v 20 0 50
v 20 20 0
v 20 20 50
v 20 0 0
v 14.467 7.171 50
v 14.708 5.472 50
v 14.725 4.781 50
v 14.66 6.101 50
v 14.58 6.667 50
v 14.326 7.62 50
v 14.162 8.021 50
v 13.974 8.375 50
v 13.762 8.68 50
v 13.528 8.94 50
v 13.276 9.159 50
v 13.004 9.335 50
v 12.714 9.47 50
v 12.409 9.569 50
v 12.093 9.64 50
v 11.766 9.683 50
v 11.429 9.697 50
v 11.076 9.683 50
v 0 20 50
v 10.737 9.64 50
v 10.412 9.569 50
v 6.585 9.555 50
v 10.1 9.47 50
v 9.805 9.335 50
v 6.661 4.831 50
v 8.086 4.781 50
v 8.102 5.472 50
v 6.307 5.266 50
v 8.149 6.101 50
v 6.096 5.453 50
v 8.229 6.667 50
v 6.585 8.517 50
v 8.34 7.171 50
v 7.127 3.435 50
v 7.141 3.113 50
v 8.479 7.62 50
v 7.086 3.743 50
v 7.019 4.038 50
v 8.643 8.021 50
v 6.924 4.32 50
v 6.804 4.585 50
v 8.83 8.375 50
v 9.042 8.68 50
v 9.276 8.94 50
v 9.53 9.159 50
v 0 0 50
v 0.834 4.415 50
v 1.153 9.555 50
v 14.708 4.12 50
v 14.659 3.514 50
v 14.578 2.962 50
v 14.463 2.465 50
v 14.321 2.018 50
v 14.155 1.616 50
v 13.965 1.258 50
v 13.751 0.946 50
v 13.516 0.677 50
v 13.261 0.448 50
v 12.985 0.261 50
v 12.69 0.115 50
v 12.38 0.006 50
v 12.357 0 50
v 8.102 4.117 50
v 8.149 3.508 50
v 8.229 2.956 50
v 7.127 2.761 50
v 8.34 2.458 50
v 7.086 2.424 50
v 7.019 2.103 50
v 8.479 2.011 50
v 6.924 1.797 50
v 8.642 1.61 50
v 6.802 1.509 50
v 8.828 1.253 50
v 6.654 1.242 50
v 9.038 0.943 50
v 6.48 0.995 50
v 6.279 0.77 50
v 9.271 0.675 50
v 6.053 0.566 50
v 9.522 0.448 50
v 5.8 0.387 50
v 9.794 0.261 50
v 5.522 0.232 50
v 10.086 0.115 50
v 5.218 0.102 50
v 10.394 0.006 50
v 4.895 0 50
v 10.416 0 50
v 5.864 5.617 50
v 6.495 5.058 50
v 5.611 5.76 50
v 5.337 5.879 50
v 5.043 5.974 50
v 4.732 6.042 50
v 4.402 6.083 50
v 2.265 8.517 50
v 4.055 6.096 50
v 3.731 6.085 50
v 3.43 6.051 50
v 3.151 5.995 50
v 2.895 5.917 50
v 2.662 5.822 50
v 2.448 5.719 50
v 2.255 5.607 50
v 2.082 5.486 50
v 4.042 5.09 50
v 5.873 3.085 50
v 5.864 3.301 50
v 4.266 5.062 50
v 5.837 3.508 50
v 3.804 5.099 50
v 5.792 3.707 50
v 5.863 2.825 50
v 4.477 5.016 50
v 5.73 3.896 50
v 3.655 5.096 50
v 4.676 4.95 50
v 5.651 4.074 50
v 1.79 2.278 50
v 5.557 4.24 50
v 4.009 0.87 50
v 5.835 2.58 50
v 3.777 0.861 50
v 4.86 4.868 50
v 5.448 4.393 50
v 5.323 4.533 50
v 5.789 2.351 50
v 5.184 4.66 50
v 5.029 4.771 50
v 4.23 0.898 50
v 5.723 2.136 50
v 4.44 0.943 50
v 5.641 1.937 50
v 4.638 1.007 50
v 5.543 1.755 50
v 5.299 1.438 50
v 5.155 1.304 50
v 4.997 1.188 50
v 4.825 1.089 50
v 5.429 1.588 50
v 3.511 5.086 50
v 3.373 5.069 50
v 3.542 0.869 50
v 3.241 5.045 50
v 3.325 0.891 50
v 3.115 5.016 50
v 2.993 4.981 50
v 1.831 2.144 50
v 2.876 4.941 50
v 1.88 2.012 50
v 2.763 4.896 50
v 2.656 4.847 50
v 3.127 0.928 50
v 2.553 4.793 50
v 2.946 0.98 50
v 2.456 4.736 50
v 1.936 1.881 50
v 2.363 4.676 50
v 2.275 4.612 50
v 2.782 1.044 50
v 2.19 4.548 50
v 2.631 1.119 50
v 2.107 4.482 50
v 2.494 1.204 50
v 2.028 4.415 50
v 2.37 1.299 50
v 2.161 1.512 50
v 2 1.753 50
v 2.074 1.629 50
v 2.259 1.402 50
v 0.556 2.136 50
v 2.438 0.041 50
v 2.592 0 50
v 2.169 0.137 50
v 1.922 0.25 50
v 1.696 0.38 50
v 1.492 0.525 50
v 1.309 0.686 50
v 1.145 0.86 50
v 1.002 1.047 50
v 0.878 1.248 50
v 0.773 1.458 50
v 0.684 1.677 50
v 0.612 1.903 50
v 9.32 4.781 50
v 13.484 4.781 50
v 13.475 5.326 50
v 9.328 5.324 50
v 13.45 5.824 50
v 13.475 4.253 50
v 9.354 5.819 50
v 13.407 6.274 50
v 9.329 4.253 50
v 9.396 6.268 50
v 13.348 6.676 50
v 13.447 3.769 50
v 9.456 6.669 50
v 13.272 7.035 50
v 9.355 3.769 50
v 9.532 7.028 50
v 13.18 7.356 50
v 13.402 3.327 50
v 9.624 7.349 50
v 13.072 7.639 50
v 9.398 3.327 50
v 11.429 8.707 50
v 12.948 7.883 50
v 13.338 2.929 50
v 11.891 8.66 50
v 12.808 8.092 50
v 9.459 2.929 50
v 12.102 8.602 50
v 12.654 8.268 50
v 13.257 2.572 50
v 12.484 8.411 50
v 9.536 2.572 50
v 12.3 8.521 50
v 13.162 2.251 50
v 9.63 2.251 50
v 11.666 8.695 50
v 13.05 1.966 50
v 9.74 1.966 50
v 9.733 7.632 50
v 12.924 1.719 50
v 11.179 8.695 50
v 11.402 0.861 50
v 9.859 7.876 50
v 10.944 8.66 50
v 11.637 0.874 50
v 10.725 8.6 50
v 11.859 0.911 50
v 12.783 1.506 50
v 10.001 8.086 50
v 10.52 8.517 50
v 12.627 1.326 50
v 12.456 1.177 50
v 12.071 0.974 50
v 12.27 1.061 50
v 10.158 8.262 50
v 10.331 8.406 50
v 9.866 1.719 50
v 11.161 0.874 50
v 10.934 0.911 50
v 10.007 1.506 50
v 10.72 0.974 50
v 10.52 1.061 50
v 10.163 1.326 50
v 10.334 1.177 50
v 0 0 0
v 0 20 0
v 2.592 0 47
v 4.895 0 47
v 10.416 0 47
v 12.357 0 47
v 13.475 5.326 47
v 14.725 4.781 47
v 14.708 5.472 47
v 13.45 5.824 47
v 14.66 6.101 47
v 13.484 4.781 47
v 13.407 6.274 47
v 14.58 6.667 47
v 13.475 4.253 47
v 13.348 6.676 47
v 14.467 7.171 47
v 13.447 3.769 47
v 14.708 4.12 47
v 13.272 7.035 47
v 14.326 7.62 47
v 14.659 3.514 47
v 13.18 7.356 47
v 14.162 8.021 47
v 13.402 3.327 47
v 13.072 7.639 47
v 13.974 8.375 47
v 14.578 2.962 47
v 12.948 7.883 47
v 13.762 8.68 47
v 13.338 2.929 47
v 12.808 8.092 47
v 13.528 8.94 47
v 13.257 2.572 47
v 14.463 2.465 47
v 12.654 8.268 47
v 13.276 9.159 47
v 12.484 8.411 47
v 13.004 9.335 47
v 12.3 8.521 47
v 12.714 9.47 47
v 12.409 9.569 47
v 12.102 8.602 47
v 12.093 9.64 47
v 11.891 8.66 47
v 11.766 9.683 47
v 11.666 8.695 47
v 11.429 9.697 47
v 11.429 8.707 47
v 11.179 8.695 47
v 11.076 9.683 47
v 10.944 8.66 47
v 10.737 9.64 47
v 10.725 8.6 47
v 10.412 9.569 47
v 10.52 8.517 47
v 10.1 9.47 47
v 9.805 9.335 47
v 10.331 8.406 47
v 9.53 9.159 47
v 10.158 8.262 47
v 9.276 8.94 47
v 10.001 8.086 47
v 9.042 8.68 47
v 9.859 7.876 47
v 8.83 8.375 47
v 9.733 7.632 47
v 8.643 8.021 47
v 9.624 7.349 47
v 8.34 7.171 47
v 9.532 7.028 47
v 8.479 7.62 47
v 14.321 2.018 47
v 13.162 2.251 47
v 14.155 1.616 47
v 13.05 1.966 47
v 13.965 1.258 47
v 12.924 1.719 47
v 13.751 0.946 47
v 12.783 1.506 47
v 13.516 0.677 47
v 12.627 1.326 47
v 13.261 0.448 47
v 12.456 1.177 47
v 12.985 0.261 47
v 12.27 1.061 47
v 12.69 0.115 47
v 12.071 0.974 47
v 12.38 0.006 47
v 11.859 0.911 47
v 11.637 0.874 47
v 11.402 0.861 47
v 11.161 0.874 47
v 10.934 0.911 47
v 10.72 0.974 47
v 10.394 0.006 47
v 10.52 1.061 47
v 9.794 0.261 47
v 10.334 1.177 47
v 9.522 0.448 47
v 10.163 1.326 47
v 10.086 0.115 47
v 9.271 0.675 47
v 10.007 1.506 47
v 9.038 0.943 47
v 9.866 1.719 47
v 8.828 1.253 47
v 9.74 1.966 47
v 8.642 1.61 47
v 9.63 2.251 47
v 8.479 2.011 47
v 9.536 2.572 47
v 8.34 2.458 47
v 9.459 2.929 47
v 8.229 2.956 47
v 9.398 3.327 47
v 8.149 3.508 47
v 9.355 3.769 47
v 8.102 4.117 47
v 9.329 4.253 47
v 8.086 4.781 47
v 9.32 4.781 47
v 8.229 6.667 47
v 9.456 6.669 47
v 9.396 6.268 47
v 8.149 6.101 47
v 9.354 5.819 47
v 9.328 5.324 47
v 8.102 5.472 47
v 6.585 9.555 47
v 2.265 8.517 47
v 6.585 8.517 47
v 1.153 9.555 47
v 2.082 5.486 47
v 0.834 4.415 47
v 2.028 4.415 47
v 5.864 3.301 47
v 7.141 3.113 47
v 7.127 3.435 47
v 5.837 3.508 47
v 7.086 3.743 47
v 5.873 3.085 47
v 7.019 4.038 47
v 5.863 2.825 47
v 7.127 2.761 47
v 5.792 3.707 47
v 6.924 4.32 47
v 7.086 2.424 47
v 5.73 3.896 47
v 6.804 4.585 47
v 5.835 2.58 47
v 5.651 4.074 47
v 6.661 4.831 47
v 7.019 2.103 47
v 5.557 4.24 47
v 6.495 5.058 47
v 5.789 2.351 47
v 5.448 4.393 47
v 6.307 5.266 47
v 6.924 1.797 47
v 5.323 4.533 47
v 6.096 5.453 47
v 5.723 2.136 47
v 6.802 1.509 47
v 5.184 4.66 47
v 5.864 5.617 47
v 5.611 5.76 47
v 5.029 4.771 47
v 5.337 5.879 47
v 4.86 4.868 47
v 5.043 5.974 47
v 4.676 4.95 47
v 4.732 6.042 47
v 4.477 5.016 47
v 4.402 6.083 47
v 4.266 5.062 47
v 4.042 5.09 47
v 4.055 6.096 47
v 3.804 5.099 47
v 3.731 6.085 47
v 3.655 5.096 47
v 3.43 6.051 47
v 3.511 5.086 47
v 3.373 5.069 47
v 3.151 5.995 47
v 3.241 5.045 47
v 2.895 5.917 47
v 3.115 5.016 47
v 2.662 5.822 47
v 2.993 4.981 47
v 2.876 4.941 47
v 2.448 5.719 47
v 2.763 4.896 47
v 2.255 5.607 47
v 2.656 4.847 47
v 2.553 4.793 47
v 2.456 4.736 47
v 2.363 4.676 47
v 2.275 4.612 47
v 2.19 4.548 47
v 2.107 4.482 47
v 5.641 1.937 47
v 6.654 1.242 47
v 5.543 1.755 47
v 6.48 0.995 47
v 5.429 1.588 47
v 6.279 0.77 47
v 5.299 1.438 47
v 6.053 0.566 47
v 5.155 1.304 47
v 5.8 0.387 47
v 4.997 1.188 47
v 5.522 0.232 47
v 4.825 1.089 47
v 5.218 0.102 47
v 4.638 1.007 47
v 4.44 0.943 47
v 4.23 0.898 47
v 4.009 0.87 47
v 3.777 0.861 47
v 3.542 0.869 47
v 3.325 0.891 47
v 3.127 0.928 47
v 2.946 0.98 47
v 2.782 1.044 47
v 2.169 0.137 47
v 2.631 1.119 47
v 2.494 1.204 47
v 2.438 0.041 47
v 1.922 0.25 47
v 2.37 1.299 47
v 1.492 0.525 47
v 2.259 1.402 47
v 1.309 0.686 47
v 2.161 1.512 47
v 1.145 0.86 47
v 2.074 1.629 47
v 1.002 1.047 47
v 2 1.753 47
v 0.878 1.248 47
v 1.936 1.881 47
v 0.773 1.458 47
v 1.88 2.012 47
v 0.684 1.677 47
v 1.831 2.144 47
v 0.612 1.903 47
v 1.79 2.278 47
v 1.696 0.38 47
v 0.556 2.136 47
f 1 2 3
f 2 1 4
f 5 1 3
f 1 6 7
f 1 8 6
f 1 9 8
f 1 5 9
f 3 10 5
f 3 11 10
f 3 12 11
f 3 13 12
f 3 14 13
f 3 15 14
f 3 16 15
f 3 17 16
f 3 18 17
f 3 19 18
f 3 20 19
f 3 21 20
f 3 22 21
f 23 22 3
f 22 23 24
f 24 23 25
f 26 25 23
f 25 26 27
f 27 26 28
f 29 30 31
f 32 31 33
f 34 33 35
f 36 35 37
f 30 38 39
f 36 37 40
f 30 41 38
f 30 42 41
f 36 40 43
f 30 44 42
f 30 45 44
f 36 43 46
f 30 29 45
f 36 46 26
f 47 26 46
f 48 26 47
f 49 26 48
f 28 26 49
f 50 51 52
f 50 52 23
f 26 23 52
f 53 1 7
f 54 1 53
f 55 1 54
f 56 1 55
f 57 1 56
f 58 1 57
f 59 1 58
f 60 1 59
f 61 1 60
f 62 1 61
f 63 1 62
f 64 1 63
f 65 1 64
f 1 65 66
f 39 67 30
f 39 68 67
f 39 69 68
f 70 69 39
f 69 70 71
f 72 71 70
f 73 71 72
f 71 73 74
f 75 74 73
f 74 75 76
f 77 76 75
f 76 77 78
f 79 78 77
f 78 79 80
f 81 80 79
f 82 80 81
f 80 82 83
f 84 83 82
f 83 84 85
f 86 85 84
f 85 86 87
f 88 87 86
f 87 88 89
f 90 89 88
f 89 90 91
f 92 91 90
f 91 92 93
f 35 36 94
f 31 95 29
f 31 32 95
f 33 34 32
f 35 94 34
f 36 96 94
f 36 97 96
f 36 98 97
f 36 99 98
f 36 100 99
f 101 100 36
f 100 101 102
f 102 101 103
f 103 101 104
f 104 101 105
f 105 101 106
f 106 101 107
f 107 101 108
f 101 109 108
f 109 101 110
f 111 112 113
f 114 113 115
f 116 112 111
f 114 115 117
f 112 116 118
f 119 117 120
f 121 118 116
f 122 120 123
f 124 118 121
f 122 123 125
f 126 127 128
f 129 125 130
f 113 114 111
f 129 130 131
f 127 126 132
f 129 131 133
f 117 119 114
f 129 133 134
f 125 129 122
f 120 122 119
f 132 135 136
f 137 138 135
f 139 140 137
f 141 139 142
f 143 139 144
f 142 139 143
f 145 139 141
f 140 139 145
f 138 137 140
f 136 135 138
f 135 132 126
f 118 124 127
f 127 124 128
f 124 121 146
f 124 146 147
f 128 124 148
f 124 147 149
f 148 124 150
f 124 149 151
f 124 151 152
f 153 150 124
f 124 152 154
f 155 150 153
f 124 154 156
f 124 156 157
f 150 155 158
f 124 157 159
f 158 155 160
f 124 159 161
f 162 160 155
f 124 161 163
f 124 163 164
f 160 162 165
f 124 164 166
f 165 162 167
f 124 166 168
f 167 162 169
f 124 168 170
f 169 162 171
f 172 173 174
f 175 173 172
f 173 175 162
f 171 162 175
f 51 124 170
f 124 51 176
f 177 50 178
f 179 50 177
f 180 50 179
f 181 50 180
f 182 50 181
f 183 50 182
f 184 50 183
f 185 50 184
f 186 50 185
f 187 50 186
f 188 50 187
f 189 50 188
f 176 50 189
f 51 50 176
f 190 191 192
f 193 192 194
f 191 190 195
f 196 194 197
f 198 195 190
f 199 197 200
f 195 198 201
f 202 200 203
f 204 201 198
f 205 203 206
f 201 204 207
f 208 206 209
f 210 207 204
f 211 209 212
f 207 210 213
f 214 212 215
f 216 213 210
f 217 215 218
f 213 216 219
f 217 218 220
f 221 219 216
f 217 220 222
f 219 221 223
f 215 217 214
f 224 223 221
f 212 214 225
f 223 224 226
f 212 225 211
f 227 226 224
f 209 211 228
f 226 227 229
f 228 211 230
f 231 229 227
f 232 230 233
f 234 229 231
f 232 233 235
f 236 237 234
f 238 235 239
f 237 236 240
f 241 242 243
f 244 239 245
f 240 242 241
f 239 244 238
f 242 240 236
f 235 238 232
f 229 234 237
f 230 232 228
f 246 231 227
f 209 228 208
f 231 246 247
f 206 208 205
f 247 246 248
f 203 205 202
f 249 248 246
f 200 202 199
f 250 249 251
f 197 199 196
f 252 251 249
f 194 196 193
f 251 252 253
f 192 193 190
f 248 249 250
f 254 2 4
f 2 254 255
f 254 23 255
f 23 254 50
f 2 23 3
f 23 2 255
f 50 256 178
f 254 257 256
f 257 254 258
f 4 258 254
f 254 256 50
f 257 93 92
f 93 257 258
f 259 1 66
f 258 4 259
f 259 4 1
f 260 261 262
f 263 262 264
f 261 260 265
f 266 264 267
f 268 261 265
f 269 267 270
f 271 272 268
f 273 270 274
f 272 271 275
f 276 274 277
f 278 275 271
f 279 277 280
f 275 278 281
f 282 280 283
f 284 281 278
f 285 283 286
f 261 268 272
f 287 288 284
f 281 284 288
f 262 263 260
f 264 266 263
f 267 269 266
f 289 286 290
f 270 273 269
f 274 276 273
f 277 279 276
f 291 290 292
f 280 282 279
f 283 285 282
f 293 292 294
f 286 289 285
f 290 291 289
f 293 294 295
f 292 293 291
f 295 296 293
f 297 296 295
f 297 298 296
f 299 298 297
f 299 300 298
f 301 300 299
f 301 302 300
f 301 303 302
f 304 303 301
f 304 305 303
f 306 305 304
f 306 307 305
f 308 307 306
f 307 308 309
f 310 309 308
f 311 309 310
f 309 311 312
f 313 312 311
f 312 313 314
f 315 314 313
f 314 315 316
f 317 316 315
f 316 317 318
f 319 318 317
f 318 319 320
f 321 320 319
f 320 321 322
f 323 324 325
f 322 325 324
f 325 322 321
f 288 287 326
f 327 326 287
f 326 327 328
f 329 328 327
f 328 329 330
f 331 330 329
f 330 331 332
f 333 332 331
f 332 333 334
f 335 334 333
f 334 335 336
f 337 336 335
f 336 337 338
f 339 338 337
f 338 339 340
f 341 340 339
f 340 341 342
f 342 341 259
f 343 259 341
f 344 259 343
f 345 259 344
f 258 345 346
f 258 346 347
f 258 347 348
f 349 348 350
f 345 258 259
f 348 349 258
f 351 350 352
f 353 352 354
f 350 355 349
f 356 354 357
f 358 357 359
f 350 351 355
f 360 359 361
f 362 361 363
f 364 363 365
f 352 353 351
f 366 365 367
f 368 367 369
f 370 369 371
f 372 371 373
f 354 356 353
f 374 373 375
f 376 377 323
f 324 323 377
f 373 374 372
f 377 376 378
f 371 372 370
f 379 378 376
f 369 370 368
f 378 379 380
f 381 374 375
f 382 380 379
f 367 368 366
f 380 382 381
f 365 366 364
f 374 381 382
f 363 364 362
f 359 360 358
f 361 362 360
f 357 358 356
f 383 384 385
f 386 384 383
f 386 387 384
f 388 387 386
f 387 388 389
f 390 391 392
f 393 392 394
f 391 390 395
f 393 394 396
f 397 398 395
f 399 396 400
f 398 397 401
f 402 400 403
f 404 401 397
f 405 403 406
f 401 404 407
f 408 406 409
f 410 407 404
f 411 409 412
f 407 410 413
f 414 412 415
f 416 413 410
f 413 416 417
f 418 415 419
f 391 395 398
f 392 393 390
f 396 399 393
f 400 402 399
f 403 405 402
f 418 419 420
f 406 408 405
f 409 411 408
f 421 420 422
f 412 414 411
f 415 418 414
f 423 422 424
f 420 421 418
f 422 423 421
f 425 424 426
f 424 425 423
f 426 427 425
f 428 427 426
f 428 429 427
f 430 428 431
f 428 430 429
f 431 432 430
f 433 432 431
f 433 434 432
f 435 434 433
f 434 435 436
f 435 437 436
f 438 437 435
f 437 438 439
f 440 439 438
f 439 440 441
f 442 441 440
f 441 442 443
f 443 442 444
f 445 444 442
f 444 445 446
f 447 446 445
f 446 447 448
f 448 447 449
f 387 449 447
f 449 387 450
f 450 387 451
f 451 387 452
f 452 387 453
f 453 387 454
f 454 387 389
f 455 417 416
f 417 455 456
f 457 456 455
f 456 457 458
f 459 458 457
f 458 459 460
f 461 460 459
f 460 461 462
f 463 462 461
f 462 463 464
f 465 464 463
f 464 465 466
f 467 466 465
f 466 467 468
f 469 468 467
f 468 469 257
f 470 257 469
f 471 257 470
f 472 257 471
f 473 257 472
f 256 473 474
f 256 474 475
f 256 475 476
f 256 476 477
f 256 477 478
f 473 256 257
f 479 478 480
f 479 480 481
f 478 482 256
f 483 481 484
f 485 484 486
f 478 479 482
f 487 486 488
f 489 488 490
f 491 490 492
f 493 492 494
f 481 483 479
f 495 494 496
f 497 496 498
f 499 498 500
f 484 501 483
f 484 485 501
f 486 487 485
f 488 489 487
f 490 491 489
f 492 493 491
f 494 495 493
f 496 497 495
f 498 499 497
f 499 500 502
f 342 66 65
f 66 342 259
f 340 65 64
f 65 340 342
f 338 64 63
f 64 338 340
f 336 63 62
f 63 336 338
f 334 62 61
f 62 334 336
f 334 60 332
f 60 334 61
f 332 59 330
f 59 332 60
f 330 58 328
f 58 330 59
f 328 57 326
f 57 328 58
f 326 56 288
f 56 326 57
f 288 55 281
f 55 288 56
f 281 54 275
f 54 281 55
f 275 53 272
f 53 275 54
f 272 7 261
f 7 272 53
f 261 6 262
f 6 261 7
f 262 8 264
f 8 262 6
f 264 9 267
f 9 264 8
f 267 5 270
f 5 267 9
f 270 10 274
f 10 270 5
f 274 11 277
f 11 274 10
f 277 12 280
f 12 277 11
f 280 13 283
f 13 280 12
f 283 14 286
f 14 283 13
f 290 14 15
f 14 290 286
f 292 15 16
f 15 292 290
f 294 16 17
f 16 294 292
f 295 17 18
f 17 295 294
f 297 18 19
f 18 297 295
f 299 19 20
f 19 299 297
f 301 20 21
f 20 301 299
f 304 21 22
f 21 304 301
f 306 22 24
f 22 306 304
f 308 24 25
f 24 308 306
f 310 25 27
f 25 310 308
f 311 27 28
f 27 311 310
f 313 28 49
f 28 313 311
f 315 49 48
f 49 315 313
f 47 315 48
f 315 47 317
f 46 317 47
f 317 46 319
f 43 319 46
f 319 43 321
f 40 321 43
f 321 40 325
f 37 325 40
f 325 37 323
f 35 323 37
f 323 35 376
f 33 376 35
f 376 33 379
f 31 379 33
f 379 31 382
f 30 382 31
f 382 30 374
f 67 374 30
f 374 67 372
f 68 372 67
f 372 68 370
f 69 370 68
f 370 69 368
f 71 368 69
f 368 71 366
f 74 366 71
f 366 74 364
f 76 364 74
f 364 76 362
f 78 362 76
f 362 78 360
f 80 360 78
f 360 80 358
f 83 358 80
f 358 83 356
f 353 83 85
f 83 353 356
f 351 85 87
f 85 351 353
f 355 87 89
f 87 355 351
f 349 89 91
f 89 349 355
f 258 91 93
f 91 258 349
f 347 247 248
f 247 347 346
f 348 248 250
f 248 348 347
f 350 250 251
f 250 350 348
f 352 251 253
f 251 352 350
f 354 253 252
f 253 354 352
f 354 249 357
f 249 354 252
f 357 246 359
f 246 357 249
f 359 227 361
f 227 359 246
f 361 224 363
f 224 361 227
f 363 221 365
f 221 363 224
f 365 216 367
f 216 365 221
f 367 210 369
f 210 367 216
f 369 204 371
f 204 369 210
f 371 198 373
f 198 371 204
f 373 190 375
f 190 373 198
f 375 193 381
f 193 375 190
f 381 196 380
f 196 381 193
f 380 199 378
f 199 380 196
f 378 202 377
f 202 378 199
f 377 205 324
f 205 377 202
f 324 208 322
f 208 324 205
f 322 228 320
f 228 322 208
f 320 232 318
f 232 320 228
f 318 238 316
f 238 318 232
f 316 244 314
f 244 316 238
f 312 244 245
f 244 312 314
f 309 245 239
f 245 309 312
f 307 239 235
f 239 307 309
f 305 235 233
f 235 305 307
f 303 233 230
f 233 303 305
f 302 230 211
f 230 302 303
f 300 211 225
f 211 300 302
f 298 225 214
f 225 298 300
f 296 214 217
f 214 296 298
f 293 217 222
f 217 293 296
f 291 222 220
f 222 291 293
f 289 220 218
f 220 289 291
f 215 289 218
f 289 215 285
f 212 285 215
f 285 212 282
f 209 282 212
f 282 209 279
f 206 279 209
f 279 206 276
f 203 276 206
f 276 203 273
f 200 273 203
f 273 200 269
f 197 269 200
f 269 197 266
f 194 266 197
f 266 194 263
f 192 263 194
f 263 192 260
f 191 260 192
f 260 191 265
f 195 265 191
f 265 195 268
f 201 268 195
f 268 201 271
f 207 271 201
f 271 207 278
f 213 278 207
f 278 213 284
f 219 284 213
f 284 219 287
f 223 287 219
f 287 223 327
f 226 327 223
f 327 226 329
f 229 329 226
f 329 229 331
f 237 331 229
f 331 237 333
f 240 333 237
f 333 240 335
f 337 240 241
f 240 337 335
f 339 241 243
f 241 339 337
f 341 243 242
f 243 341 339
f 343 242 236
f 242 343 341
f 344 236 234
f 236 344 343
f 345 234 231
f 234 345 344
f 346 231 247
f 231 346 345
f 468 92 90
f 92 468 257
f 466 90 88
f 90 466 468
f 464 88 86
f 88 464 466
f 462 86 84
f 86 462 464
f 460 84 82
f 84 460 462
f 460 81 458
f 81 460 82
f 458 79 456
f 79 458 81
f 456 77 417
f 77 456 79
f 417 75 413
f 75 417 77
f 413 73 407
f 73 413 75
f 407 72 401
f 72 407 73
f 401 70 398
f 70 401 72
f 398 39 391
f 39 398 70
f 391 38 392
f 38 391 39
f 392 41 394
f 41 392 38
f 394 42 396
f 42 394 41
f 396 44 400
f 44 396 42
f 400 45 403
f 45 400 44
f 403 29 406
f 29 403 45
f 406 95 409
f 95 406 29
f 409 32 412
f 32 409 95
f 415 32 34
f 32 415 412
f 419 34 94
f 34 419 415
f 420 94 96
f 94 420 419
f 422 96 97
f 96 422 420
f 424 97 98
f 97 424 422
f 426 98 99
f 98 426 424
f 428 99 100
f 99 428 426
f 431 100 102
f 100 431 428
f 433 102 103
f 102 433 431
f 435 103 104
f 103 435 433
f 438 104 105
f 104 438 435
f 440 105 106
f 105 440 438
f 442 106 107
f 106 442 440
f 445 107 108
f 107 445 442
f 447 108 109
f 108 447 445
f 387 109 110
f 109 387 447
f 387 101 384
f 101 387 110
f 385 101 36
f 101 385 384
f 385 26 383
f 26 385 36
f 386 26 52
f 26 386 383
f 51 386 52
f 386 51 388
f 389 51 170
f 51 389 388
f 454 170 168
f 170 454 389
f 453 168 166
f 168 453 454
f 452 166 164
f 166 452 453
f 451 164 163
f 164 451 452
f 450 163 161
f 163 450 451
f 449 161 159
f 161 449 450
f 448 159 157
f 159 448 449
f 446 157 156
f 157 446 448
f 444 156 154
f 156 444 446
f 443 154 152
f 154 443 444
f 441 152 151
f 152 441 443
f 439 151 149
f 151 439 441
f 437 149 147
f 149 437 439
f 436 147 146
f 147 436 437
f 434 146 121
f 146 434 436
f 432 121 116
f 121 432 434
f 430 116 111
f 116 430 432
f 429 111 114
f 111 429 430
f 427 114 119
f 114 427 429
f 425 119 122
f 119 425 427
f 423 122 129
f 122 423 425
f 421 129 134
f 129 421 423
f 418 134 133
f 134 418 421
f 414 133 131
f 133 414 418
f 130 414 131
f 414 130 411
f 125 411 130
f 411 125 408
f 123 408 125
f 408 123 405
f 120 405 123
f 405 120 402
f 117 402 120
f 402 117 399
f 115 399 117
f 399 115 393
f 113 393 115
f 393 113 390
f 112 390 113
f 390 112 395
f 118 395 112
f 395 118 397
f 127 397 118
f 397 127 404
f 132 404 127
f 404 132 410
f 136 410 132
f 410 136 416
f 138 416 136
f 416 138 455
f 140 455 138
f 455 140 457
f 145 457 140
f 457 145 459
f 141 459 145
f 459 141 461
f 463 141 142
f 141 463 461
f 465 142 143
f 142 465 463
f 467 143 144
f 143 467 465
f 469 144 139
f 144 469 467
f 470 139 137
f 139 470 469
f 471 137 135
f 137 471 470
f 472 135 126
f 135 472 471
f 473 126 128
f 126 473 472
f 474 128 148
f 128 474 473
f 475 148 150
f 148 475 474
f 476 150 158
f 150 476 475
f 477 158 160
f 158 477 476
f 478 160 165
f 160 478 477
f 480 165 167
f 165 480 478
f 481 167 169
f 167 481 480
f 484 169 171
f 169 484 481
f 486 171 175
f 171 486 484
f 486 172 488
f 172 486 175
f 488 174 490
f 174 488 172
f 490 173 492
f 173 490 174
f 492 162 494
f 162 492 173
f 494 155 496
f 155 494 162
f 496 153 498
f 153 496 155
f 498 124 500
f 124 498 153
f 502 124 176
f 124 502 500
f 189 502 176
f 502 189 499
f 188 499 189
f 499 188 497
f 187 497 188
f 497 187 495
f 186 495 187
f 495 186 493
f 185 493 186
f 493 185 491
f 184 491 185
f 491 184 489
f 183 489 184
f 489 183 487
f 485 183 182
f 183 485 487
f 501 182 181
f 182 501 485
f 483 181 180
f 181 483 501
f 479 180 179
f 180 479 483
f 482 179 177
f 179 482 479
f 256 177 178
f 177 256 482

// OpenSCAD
// focus cube

module focusCube(focusHeight = 50, text = "50", widthLength = 20, textDepth = 3 /*use 0 for no text*/){
    difference(){
        cube([widthLength,widthLength,focusHeight]);
        translate([0,0,focusHeight-textDepth]) linear_extrude(height=textDepth) #text(text);
    }
}
focusCube();
